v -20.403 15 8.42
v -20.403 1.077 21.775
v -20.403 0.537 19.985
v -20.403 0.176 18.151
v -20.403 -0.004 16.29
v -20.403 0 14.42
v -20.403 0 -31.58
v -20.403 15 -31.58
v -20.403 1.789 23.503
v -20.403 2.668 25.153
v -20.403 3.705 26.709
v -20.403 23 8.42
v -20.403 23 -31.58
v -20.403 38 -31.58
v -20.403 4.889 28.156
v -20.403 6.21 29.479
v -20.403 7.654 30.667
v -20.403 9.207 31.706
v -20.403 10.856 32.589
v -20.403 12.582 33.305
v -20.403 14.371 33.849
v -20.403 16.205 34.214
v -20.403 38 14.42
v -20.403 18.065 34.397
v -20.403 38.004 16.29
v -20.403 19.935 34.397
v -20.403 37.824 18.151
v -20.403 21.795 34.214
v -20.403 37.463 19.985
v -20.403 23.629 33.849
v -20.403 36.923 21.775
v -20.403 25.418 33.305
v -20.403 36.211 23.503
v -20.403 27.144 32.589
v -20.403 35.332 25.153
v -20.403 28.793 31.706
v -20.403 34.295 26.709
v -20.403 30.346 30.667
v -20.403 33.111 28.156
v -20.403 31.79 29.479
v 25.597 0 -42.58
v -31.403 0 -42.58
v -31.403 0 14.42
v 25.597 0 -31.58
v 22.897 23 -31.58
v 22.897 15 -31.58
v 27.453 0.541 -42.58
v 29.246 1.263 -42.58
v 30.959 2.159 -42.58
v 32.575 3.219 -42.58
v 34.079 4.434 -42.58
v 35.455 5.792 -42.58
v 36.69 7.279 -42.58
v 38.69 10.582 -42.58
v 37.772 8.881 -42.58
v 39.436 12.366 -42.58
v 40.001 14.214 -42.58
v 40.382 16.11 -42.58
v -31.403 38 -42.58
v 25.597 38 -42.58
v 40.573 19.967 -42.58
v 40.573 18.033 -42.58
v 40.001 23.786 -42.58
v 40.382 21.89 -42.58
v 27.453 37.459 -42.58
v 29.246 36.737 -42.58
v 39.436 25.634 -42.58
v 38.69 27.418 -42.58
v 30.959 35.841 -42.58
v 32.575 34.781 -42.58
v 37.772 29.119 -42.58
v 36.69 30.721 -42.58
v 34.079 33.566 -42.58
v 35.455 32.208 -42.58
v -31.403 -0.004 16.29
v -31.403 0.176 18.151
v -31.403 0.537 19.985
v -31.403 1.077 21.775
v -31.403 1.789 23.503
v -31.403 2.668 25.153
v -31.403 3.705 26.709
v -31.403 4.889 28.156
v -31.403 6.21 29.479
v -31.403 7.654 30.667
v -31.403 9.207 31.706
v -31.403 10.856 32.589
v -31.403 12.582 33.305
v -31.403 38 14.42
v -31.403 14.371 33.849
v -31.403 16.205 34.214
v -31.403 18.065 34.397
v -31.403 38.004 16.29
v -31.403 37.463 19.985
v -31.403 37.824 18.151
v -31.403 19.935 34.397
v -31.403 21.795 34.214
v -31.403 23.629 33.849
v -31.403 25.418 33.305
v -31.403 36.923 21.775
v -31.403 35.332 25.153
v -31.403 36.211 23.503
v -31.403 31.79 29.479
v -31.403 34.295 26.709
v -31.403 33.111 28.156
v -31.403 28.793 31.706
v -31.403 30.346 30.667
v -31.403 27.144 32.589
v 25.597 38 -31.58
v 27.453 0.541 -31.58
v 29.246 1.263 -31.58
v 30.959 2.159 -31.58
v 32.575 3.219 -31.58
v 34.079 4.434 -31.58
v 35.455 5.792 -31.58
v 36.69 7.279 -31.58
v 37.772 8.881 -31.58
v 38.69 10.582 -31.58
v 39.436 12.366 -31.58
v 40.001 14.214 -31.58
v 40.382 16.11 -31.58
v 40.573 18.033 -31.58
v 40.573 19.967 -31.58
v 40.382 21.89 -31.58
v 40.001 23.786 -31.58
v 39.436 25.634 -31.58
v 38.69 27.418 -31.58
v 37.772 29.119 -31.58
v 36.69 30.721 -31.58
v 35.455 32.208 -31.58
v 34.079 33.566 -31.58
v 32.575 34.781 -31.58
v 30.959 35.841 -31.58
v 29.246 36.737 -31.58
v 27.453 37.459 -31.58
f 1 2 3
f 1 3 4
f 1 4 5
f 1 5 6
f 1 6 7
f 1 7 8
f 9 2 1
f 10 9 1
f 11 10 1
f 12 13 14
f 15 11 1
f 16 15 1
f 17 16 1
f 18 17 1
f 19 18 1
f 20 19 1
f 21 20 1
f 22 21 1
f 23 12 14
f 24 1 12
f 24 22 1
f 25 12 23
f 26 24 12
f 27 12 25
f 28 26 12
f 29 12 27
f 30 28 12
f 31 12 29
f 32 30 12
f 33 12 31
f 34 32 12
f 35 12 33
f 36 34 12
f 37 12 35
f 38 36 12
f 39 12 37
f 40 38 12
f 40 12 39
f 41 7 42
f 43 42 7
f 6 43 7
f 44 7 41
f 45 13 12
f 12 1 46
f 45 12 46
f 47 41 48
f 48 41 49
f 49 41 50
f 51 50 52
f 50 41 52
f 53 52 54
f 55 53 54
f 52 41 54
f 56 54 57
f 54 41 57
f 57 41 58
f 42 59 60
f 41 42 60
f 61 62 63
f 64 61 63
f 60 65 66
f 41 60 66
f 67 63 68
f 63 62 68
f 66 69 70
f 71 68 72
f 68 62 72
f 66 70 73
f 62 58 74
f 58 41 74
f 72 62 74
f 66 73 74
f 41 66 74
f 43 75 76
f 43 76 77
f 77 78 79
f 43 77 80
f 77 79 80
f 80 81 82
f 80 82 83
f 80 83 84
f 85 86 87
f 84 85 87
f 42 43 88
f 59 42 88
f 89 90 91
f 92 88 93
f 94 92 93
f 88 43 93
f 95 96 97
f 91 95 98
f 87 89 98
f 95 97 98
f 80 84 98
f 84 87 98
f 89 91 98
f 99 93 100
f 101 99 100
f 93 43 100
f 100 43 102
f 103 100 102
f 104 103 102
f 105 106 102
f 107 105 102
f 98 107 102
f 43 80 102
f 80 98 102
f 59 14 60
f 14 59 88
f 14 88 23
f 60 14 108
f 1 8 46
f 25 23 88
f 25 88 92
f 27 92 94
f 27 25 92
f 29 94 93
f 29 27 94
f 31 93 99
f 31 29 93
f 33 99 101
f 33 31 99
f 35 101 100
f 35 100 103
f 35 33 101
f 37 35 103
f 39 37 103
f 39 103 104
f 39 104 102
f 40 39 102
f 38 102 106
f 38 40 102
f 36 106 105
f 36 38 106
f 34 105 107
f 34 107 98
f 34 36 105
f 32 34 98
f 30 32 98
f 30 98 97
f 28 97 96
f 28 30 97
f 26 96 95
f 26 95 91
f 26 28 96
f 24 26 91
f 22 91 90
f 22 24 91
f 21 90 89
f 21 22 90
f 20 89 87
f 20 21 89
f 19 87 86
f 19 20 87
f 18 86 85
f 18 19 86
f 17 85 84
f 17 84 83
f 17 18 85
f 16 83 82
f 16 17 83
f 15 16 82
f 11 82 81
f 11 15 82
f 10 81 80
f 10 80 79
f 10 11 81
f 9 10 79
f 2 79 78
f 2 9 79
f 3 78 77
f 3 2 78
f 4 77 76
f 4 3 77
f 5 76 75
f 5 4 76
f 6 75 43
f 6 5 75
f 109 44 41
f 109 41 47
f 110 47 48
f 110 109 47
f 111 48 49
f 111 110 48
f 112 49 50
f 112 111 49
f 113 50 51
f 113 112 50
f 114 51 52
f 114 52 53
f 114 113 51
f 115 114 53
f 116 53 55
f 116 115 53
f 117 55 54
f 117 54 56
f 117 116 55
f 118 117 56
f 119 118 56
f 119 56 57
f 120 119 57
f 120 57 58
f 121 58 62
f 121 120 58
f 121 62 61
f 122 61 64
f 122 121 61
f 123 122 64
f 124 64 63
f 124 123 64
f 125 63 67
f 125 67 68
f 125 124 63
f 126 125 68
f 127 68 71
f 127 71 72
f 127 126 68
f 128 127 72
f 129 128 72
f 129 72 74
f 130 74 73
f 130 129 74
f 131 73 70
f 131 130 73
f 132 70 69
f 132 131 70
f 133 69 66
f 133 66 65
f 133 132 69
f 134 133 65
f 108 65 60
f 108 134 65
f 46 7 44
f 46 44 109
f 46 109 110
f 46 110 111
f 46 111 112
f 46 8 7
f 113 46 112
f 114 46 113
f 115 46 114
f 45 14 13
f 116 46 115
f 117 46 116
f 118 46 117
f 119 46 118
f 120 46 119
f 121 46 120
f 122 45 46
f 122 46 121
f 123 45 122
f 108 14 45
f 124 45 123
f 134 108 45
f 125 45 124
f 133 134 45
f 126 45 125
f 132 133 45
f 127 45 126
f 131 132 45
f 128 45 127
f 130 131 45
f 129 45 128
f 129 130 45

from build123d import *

# Parameters (mm, degrees)
F1_DEPTH = 38
F2_W     = 8
F2_H     = 40
F3_DEPTH = 43.3
F5_DEPTH = 11
F7_DEPTH = 11
F9_DEPTH = 42.4


with BuildPart() as f1:
    # F0 (on Front) → F1 (new body)
    with BuildSketch(Plane.XZ):
        Polygon((-20.403226763, 14.420258379), (-31.403226763, 14.420258379), (-31.403226763, -42.579741621), (25.596773237, -42.579741621), (25.596773237, -31.579741621), (-20.403226763, -31.579741621), align=None)
    extrude(amount=-F1_DEPTH)

    # F2 (on face) → F3 (join)
    with BuildSketch(Plane.YZ.offset(-20.403226763)):
        Polygon((23, -31.579741621), (15, -31.579741621), (26, -37.2273437679), (34.1856418401, -37.2273437679), align=None)
        with Locations((19, -11.579741621)):
            Rectangle(F2_W, F2_H)
    extrude(amount=F3_DEPTH)

    # F4 (on face) → F5 (join)
    with BuildSketch(Plane.XY.offset(-31.579741621)):
        with BuildLine():
            Line((25.596773237, 38), (25.596773237, 0))
            ThreePointArc((25.596773237, 0), (40.596773237, 19), (25.596773237, 38))
        make_face()
    extrude(amount=-F5_DEPTH)

    # F6 (on face) → F7 (join)
    with BuildSketch(Plane.YZ.offset(-20.403226763)):
        with BuildLine():
            Line((0, 14.420258379), (38, 14.420258379))
            ThreePointArc((38, 14.420258379), (19, 34.420258379), (0, 14.420258379))
        make_face()
    extrude(amount=-F7_DEPTH)

    # F8 (on face) → F9 (cut)
    with BuildSketch(Plane.XZ.offset(-15)):
        Polygon((22.896773237, 8.420258379), (-20.403226763, 8.420258379), (22.896773237, -31.579741621), align=None)
    extrude(amount=-F9_DEPTH, mode=Mode.SUBTRACT)


solid = f1.part
